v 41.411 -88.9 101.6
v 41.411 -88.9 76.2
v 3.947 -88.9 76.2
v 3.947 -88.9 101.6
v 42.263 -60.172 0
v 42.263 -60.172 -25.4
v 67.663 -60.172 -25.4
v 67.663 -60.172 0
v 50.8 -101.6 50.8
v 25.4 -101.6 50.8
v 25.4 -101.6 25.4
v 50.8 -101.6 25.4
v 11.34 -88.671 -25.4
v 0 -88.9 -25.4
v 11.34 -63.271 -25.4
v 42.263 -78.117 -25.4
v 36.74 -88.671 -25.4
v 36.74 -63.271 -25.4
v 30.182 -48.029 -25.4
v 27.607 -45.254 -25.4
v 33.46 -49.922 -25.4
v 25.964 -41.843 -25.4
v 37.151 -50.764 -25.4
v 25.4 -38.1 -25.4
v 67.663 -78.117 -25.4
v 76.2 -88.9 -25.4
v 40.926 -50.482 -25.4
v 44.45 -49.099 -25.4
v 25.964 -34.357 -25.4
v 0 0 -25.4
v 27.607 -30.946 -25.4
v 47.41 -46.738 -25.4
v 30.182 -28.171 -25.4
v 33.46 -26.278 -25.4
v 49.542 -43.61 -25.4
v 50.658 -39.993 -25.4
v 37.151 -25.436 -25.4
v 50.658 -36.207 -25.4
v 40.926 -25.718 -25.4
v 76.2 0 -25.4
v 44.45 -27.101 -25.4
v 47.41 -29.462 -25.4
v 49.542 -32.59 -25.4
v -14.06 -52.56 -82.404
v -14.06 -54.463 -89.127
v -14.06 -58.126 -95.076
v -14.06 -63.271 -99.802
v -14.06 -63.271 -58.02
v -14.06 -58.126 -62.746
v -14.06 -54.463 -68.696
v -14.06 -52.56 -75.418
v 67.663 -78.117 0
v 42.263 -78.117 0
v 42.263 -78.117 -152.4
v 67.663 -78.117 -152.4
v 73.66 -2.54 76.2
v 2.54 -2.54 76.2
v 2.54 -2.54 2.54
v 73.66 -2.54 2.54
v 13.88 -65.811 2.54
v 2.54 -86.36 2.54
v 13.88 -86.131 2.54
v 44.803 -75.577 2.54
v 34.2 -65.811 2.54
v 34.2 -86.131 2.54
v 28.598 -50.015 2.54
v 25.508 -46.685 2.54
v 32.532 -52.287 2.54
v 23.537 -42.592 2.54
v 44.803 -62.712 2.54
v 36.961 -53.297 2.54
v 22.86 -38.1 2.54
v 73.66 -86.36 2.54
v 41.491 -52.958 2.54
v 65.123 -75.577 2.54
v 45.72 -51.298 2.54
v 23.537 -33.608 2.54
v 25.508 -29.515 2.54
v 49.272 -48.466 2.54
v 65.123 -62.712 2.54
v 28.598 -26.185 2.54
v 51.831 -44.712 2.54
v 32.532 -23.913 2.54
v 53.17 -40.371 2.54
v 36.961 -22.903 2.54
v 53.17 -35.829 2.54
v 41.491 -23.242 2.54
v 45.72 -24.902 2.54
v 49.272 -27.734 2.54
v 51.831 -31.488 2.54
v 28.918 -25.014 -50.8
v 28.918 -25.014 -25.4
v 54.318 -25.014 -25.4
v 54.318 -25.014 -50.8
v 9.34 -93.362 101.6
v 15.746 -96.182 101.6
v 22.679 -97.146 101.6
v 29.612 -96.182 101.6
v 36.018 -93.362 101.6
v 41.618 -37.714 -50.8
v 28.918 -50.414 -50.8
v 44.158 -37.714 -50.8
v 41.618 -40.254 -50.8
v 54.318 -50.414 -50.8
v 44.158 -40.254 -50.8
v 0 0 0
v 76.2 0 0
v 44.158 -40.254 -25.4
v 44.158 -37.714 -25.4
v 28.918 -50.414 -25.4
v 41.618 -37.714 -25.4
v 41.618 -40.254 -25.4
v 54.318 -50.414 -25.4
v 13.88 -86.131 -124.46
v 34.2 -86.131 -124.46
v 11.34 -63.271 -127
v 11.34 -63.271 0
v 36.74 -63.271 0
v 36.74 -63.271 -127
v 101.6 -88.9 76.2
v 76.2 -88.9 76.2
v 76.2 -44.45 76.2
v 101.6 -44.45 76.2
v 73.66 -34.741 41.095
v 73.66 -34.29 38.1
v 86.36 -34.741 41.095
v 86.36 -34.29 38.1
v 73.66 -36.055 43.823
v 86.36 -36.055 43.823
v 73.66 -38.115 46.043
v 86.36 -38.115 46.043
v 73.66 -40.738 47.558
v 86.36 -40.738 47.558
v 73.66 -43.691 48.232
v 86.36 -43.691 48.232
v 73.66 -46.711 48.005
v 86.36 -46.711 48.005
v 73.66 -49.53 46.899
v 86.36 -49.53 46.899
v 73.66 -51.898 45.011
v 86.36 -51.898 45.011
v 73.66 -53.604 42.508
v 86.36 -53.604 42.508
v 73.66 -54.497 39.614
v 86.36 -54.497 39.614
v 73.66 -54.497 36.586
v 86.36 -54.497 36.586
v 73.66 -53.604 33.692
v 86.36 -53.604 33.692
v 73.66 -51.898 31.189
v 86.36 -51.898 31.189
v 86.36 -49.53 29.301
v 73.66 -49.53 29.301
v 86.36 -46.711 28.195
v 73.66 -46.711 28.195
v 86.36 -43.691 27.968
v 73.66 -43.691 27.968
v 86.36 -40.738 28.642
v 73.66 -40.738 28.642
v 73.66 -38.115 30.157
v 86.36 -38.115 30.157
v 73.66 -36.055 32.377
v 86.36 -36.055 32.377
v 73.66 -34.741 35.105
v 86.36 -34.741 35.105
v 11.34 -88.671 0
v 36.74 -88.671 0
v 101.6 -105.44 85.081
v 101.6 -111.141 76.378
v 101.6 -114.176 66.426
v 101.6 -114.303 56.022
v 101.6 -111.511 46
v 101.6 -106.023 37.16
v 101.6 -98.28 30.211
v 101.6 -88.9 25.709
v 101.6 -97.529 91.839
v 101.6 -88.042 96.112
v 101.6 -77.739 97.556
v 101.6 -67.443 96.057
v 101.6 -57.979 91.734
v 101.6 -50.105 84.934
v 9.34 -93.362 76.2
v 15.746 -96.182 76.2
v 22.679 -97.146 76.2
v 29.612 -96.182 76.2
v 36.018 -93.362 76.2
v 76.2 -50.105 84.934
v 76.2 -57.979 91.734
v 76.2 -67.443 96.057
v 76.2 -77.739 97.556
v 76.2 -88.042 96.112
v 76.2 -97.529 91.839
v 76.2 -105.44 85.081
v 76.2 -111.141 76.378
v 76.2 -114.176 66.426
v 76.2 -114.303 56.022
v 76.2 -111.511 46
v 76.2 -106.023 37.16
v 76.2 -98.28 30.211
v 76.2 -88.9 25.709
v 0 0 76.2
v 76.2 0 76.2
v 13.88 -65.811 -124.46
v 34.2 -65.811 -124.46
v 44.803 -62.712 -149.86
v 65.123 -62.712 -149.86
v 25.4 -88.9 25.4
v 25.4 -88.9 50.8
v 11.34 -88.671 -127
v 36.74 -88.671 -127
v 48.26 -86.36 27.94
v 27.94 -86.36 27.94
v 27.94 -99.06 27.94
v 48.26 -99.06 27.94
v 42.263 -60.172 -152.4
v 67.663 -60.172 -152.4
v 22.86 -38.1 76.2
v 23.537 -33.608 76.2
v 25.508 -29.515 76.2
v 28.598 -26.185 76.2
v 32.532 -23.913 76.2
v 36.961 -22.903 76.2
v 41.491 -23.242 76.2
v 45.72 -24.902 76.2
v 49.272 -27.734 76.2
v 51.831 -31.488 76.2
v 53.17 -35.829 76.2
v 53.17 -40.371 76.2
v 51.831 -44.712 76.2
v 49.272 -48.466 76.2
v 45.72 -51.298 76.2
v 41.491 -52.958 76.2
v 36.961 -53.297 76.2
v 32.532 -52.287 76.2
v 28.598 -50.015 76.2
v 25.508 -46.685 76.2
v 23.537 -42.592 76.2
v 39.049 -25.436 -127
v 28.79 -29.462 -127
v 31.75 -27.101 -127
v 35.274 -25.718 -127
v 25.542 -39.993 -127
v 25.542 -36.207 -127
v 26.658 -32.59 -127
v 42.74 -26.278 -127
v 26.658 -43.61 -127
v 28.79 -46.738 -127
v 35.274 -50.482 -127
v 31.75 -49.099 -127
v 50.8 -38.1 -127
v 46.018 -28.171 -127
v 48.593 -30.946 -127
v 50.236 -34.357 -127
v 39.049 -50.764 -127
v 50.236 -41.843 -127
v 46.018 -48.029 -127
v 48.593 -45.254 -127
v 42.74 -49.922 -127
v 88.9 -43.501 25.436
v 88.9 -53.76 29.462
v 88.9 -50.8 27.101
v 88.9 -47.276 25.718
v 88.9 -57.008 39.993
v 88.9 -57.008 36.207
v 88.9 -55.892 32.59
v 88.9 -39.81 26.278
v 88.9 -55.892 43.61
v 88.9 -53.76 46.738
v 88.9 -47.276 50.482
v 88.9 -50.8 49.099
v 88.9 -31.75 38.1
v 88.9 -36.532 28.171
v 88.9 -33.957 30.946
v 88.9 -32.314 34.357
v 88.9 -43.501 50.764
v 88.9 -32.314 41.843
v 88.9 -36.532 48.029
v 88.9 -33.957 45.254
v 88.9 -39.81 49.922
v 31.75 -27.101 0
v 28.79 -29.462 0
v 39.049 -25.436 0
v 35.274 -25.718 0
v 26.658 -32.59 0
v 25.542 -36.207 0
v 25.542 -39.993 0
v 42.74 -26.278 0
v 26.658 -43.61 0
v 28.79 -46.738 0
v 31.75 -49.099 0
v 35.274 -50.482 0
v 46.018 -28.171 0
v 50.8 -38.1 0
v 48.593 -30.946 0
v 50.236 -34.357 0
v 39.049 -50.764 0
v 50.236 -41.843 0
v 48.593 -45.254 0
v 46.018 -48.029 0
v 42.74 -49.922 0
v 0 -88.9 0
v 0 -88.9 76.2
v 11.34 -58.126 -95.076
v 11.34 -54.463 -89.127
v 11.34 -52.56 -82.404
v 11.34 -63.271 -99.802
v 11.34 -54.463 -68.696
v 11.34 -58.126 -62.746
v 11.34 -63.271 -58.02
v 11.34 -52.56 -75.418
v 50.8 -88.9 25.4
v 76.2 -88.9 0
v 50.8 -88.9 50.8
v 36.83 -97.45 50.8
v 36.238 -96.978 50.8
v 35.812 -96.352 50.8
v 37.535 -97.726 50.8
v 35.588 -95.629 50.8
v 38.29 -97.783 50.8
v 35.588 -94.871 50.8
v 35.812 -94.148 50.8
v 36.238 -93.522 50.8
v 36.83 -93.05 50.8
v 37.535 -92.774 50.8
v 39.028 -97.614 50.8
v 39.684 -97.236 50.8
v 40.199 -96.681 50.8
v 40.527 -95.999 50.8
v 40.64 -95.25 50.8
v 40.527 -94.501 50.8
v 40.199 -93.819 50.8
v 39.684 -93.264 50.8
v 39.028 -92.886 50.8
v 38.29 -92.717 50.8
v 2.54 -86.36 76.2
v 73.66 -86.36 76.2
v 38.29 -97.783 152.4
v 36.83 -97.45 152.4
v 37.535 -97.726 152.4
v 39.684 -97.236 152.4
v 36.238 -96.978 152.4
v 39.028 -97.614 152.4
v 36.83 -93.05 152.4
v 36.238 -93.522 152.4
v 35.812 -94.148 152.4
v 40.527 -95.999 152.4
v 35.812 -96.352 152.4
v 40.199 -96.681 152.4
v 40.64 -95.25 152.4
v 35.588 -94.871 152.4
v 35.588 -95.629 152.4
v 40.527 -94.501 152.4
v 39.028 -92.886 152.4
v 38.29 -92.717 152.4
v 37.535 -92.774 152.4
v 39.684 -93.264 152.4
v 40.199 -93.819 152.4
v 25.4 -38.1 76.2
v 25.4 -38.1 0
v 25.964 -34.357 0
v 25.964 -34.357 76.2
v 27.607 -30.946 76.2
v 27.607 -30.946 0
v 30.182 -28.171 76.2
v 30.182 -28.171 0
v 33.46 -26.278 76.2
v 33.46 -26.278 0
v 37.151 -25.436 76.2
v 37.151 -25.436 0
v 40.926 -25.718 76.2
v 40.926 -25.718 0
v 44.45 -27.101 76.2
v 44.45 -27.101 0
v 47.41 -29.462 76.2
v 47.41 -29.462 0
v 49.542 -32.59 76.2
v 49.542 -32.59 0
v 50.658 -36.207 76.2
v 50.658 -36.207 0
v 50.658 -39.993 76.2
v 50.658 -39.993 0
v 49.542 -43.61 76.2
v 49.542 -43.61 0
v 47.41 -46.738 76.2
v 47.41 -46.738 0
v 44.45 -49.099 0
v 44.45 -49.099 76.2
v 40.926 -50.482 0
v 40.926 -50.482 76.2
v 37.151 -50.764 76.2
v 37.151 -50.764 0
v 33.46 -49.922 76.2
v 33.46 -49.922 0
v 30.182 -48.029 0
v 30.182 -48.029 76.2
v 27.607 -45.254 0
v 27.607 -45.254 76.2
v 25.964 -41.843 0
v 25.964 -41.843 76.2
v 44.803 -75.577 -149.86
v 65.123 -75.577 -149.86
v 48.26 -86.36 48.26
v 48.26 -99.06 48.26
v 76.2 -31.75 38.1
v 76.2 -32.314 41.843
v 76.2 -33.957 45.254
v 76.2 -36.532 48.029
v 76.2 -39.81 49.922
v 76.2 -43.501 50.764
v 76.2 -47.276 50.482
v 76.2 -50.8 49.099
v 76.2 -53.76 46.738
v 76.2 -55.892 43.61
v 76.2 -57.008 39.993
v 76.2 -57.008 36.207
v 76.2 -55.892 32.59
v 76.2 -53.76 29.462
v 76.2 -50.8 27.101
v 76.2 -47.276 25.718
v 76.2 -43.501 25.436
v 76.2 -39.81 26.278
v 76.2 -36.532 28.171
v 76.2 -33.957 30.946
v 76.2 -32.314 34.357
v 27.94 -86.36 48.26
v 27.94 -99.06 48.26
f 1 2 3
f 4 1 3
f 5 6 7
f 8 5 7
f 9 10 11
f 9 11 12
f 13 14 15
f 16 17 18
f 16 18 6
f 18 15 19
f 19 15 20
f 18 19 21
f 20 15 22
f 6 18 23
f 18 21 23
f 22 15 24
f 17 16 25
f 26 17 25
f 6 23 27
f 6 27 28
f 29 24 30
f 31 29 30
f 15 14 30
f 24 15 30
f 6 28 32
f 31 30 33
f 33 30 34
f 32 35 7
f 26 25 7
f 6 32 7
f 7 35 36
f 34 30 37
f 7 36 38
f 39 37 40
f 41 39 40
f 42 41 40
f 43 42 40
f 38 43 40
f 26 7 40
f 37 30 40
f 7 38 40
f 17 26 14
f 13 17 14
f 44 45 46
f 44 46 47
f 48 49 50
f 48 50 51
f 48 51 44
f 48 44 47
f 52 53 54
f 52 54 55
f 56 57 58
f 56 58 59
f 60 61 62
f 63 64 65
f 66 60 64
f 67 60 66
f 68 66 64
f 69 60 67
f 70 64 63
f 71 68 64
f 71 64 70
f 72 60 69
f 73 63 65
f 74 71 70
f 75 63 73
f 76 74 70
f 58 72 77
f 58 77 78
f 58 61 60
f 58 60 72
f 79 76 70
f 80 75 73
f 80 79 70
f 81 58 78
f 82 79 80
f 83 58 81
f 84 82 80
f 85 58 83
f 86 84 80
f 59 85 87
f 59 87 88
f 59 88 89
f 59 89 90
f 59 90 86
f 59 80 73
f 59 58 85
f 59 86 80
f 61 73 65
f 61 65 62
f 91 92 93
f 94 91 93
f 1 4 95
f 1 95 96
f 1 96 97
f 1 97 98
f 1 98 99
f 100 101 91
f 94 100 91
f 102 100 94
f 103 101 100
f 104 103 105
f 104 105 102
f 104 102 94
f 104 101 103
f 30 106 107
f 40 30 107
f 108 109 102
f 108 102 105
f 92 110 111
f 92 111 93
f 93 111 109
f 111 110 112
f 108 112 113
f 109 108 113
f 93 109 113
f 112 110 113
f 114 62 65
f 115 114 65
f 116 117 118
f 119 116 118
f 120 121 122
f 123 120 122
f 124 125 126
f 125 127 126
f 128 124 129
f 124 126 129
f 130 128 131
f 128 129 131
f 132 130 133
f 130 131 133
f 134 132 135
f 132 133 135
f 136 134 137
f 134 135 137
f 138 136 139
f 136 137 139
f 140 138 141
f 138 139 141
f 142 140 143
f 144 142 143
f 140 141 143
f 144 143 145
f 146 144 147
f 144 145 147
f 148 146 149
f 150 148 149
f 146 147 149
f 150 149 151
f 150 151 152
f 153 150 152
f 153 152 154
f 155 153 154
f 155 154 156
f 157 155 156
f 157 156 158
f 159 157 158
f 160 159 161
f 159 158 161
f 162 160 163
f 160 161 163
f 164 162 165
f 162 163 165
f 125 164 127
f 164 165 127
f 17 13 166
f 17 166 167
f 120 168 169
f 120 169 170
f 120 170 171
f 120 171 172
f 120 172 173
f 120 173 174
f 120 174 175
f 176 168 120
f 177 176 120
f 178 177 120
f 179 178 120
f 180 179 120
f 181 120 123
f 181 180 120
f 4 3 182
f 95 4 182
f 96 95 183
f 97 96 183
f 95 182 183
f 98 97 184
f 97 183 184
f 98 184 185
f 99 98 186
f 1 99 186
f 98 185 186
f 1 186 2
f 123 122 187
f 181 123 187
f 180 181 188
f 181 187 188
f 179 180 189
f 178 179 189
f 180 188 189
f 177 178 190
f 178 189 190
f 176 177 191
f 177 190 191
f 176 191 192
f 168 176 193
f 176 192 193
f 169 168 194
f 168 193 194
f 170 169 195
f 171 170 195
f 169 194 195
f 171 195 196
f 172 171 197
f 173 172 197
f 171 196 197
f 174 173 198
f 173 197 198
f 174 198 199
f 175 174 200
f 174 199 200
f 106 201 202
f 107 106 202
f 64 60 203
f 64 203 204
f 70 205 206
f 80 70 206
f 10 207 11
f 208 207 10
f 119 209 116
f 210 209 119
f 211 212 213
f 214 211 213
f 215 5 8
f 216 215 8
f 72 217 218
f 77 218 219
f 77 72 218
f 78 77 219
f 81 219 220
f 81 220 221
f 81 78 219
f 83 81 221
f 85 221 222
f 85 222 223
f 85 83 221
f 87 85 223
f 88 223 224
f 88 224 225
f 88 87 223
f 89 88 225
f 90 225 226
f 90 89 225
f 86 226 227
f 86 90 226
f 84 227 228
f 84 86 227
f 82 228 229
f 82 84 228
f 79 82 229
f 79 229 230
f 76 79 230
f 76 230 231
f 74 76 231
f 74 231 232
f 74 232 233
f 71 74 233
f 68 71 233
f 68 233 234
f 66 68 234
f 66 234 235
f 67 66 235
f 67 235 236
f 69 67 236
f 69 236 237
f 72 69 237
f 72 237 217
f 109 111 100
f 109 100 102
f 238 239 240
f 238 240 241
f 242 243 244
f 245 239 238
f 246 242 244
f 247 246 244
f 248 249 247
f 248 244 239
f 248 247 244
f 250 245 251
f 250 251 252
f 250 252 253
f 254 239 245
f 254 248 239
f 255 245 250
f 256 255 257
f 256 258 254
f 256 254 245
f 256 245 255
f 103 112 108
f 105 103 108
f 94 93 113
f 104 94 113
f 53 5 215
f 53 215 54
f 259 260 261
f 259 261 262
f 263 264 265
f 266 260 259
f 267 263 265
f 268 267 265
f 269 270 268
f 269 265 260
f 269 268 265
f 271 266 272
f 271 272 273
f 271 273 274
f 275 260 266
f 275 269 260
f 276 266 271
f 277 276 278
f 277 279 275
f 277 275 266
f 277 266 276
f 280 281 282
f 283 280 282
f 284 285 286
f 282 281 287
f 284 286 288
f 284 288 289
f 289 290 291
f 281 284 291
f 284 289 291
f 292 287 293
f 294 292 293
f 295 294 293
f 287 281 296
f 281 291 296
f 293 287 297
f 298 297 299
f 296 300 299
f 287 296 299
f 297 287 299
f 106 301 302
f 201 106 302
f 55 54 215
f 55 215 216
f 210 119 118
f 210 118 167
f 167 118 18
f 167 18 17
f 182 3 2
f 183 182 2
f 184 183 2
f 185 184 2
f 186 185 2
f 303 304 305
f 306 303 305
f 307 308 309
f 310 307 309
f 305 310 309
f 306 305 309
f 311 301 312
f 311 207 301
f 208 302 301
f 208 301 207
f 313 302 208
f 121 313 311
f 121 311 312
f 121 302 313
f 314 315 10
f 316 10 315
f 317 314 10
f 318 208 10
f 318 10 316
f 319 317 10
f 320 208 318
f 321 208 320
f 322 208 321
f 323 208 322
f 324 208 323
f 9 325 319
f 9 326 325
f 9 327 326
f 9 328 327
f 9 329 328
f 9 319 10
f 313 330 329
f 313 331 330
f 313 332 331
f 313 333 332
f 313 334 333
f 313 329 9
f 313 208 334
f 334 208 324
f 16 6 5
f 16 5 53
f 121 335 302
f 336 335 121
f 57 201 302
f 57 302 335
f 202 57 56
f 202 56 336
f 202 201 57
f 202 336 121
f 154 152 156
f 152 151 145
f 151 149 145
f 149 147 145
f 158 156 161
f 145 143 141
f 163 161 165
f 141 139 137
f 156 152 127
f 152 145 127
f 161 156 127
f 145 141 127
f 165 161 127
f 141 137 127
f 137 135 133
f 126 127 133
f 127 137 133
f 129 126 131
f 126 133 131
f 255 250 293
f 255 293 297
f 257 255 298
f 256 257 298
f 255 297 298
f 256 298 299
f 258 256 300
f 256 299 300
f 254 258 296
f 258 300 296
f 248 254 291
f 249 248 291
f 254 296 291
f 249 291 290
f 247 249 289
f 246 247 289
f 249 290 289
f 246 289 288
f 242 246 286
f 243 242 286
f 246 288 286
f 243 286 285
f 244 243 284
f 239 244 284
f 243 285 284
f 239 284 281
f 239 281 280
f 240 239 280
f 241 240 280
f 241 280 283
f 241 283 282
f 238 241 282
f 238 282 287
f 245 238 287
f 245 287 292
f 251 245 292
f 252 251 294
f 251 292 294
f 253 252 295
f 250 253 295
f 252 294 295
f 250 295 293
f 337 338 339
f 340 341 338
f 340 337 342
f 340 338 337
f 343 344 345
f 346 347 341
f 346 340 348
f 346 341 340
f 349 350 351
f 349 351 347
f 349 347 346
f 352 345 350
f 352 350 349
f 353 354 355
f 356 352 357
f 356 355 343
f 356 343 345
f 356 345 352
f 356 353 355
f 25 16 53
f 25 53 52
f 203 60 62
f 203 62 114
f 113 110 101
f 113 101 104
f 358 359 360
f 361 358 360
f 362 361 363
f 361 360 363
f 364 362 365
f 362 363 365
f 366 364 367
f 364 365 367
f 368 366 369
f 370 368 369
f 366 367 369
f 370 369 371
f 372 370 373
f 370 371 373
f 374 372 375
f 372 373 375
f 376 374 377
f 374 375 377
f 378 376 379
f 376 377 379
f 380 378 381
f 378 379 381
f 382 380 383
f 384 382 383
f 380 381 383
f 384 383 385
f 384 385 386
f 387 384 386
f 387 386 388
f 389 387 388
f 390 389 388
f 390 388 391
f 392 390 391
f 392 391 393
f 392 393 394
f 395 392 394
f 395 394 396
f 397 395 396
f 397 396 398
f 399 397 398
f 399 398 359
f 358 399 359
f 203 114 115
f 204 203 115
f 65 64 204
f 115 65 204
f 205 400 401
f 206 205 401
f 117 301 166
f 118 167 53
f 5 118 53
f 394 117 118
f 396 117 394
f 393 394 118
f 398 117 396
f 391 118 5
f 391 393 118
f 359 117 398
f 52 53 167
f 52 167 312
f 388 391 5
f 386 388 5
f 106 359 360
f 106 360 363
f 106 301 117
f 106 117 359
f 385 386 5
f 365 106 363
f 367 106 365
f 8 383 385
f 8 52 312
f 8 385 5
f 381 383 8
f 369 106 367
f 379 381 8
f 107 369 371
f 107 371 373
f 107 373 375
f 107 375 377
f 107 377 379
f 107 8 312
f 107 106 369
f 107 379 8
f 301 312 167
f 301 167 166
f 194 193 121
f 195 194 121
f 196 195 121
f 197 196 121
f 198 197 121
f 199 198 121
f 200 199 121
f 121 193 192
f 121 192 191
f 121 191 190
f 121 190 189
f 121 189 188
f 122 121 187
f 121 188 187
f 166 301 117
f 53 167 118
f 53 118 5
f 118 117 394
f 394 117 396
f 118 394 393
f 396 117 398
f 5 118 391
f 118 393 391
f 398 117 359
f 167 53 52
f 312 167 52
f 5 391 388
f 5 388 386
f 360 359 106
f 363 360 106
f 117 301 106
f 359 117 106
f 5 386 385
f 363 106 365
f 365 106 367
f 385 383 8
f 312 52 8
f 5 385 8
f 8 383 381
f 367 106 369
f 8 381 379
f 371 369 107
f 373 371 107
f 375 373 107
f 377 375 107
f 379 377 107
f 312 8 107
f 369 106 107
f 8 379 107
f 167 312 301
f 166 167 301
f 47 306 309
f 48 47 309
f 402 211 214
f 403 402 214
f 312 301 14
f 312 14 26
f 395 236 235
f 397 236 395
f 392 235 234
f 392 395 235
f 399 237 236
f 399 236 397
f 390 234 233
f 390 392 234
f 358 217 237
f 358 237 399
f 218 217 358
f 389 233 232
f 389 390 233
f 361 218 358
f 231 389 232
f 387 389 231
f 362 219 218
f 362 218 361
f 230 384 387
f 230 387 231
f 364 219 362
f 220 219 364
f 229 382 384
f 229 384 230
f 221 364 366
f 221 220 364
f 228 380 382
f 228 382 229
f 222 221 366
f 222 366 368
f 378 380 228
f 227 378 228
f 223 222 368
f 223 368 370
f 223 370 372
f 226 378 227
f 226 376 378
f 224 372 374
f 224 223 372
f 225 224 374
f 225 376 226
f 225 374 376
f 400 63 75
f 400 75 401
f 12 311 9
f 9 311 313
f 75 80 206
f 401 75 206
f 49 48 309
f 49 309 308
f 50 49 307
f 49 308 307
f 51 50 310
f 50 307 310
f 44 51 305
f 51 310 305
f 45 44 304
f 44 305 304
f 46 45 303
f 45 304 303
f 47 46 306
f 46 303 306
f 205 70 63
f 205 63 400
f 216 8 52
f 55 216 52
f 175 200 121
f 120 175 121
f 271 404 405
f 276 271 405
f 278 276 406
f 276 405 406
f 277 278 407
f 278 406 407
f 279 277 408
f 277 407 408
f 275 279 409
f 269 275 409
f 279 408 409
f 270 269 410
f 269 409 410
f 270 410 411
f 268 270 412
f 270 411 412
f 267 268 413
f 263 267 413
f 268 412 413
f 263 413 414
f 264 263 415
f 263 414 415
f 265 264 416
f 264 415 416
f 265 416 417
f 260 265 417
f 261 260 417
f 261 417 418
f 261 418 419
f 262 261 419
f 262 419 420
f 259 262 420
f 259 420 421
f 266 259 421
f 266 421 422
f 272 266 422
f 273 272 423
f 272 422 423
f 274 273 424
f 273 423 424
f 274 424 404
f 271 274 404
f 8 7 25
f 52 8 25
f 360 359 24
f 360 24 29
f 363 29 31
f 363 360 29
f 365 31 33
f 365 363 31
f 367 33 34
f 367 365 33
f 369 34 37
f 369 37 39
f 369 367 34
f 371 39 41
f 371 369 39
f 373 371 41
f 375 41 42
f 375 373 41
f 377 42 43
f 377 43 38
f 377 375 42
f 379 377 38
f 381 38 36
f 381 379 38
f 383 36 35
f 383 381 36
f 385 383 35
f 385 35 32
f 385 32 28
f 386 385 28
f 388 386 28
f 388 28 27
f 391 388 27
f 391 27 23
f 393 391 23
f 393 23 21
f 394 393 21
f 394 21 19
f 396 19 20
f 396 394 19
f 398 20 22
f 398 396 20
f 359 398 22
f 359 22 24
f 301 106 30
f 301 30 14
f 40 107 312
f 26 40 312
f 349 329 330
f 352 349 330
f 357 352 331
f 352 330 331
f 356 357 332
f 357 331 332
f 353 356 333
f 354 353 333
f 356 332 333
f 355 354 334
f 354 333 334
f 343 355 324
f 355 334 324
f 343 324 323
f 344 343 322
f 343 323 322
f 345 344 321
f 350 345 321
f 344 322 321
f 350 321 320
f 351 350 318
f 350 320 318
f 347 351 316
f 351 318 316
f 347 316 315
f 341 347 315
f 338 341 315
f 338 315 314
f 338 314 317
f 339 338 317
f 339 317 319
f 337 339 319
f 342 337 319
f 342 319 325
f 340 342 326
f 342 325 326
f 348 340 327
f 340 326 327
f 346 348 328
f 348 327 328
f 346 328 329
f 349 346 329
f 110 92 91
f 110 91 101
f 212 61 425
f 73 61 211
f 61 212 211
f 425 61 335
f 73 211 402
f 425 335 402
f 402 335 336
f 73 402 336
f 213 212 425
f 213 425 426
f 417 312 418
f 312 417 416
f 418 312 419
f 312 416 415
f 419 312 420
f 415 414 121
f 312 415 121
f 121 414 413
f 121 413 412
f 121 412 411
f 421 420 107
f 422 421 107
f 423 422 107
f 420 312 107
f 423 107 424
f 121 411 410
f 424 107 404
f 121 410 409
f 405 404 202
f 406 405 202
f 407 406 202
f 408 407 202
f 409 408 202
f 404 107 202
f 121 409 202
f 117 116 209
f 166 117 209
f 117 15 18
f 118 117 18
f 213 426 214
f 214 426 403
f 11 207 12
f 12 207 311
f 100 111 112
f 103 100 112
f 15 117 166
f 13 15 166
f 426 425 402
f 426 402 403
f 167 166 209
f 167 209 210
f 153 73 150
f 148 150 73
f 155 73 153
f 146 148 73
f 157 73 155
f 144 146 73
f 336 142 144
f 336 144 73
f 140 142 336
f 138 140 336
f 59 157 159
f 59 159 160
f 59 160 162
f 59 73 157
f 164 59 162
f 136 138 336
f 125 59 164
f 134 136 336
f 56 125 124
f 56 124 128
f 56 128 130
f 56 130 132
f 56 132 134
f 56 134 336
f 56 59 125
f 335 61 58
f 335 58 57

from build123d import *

# Parameters (mm, degrees)
F0_W          = 76.2
F0_H          = 76.2
F1_DEPTH      = 76.2
F3_D          = 25.4
F5_W          = 76.2
F5_H          = 76.2
F5_W_2        = 25.4
F5_H_2        = 25.4
F1_FACE1_W    = 76.2
F1_FACE1_H    = 76.2
F1_FACE2_W    = 76.2
F1_FACE2_H    = 76.2
F4_W          = 76.2
F4_H          = 76.2
F6_DEPTH      = 12.7
F7_W          = 25.4
F7_H          = 25.4
F8_DEPTH      = 12.7
F9_R          = 12.7
F10_DEPTH     = 12.7
F11_DEPTH     = 12.7
F14_DEPTH     = 25.4
F16_DEPTH     = 25.4
F17_R         = 2.54
F18_DEPTH     = 101.6
F21_W         = 25.4
F21_H         = 17.9451964796
F22_DEPTH     = 177.8
F23_W         = 25.4
F23_H         = 25.4
F24_DEPTH     = 127
F23_R         = 12.7
F25_DEPTH     = 25.4
F26_W         = 25.4
F26_H         = 25.4
F26_W_2       = 2.54
F26_H_2       = 2.54
F27_DEPTH     = 25.4
F28_T         = 2.54
F28_T3_DEPTH  = 30.48
F28_T5_DEPTH  = 30.48
F28_T7_DEPTH  = 30.48
F28_T9_DEPTH  = 30.48
F28_T11_DEPTH = 23.0251964796
F28_T13_DEPTH = 30.48
F30_DEPTH     = 25.4


# Not quite as in the source:
# - a shell that OpenCascade refuses in one call is made with other operations: the cavity is built on its own and cut out
# - the program builds the solid bodies; features that only make, move or delete a surface that nothing else refers to are left out


with BuildPart() as f1:
    # F0 (on Front) → F1 (new body)
    with BuildSketch(Plane.XZ):
        with Locations((38.1, 38.1)):
            Rectangle(F0_W, F0_H)
    extrude(amount=F1_DEPTH)

    # F3 (through all)
    with Locations(Plane.XY.offset(76.2)):
        with Locations((38.1, -38.1)):
            Hole(F3_D / 2)

    # F5 (on face) + F1_face1 (on face) + F1_face2 (on face) + F4 (on face) → F6 (join)
    with BuildSketch(Plane.XZ.offset(76.2)):
        with Locations((38.1, 38.1)):
            Rectangle(F5_W, F5_H)
        with Locations((42.7430447519, 38.5519705385)):
            Rectangle(F5_W_2, F5_H_2, mode=Mode.SUBTRACT)
        with Locations((42.7430447519, 38.5519705385)):
            Rectangle(F5_W_2, F5_H_2)
    with BuildSketch(Plane(origin=(38.1, -76.2, 38.1), x_dir=(1, 0, 0), z_dir=(0, -1, 0))):
        Rectangle(F1_FACE1_W, F1_FACE1_H)
    with BuildSketch(Plane(origin=(38.1, 0, 38.1), x_dir=(1, 0, 0), z_dir=(0, 1, 0))):
        Rectangle(F1_FACE2_W, F1_FACE2_H)
    with BuildSketch(Plane.XZ.offset(76.2)):
        with Locations((38.1, 38.1)):
            Rectangle(F4_W, F4_H)
    extrude(amount=F6_DEPTH, dir=(0, -1, 0))

    # F7 (on face) → F8 (join)
    with BuildSketch(Plane.XZ.offset(88.9)):
        with Locations((38.1, 38.1)):
            Rectangle(F7_W, F7_H)
    extrude(amount=F8_DEPTH)

    # F9 (on face) → F10 (join)
    with BuildSketch(Plane.YZ.offset(76.2)):
        with Locations((-44.45, 38.1)):
            Circle(F9_R)
    extrude(amount=F10_DEPTH)

    # F9 (on face) → F11 (join)
    with BuildSketch(Plane.YZ.offset(76.2)):
        with Locations((-44.45, 38.1)):
            Circle(F9_R)
    extrude(amount=F11_DEPTH)

    # F17 (on face) → F18 (join)
    with BuildSketch(Plane.XY.offset(50.8)):
        with Locations((38.1, -95.25)):
            Circle(F17_R)
    extrude(amount=F18_DEPTH)

    # F21 (on face) → F22 (join)
    with BuildSketch(Plane(origin=(0, 0, 25.4), x_dir=(1, 0, 0), z_dir=(0, 0, -1))):
        with Locations((54.9631331444, 69.1445562989)):
            Rectangle(F21_W, F21_H)
    extrude(amount=F22_DEPTH)

    # F23 (on face) → F24 (join)
    with BuildSketch(Plane(origin=(0, 0, 0), x_dir=(1, 0, 0), z_dir=(0, 0, -1))):
        with Locations((24.0401503026, 75.9710382342)):
            Rectangle(F23_W, F23_H)
    extrude(amount=F24_DEPTH)


with BuildPart() as f14:
    # F13 (on face) → F14 (new body)
    with BuildSketch(Plane.XY.offset(76.2)):
        with BuildLine():
            Line((41.4113799153, -88.9), (3.9465616716, -88.9))
            ThreePointArc((3.9465616716, -88.9), (22.6789707935, -97.1460835815), (41.4113799153, -88.9))
        make_face()
    extrude(amount=F14_DEPTH)


with BuildPart() as f16:
    # F15 (on face) → F16 (new body)
    with BuildSketch(Plane.YZ.offset(76.2)):
        with BuildLine():
            Line((-88.9, 76.2), (-44.45, 76.2))
            ThreePointArc((-44.45, 76.2), (-105.4397398951, 85.081047549), (-88.9, 25.7088454487))
            Line((-88.9, 25.7088454487), (-88.9, 76.2))
        make_face()
    extrude(amount=F16_DEPTH)


with BuildPart() as f24:
    # F23 (on face) → F24, piece 2 (new body)
    with BuildSketch(Plane(origin=(0, 0, 0), x_dir=(1, 0, 0), z_dir=(0, 0, -1))):
        with Locations((38.1, 38.1)):
            Circle(F23_R)
    extrude(amount=F24_DEPTH)


with BuildPart() as f25:
    # F25 (new): a face of the model
    f25_faces = [f1.part.faces().sort_by_distance(p)[0] for p in [
        (38.1, -1.1708821461, 0),
    ]]
    extrude(f25_faces, amount=F25_DEPTH)


with BuildPart() as f27:
    # F26 (on face) → F27 (new body)
    with BuildSketch(Plane(origin=(0, 0, -25.4), x_dir=(1, 0, 0), z_dir=(0, 0, -1))):
        with Locations((41.617895323, 37.7135920942)):
            Rectangle(F26_W, F26_H)
        with Locations((42.887895323, 38.9835920942)):
            Rectangle(F26_W_2, F26_H_2, mode=Mode.SUBTRACT)
    extrude(amount=F27_DEPTH)


with BuildPart() as f1_1:
    add(f1.part)

    # F28: shell of thickness 2.54, made by hand


with BuildPart() as f28_core1:
    # F28_t2: copy of F1
    add(f1_1.part)

    # the walls: a layer under each face that stays
    f28_faces = [f28_core1.faces().sort_by_distance(p)[0] for p in [
        (0, -44.45, 38.1),
        (38.1, 0, 38.1),
        (12.7, -88.9, 12.7),
        (12.7, -44.45, 0),
        (76.2, -74.0833333333, 12.7),
        (25.4, -38.1, 38.1),
        (46.5666666667, -99.4833333333, 50.8),
        (25.4, -95.25, 38.1),
        (38.1, -95.25, 25.4),
        (50.8, -95.25, 38.1),
        (11.3401503026, -75.9710382342, -63.5),
        (24.0401503026, -88.6710382342, -63.5),
        (36.7401503026, -75.9710382342, -63.5),
        (24.0401503026, -63.2710382342, -63.5),
        (67.6631331444, -69.1445562989, -76.2),
        (54.9631331444, -60.1719580591, -76.2),
        (54.9631331444, -78.1171545386, -76.2),
        (42.2631331444, -69.1445562989, -76.2),
        (82.55, -57.15, 38.1),
        (38.1, -101.6, 38.1),
        (24.0401503026, -75.9710382342, -127),
        (54.9631331444, -69.1445562989, -152.4),
        (88.9, -44.45, 38.1),
        (38.1, -95.25, 152.4),
    ]]
    thicken(f28_faces, amount=-F28_T, mode=Mode.SUBTRACT)

    # F28_s4 → F28_t3 (cut)
    with BuildSketch(Plane.YZ.offset(22.86)):
        Polygon((-88.9254, 50.8254), (-86.36, 50.8), (-86.36, 48.26), (-88.9, 48.26), align=None)
        Polygon((-88.9254, 25.3746), (-86.36, 25.4), (-86.36, 27.94), (-88.9, 27.94), align=None)
    extrude(amount=F28_T3_DEPTH, mode=Mode.SUBTRACT)

    # F28_s6 → F28_t5 (cut)
    with BuildSketch(Plane.XY.offset(22.86)):
        Polygon((25.3746, -88.9254), (25.4, -86.36), (27.94, -86.36), (27.94, -88.9), align=None)
        Polygon((50.8254, -88.9254), (50.8, -86.36), (48.26, -86.36), (48.26, -88.9), align=None)
    extrude(amount=F28_T5_DEPTH, mode=Mode.SUBTRACT)

    # F28_s8 → F28_t7 (cut)
    with BuildSketch(Plane.XZ.offset(60.7310382342)):
        Polygon((11.3147503026, -0.0254), (11.3401503026, 2.54), (13.8801503026, 2.54), (13.8801503026, 0), align=None)
        Polygon((36.7655503026, -0.0254), (36.7401503026, 2.54), (34.2001503026, 2.54), (34.2001503026, 0), align=None)
    extrude(amount=F28_T7_DEPTH, mode=Mode.SUBTRACT)

    # F28_s10 → F28_t9 (cut)
    with BuildSketch(Plane.YZ.offset(8.8001503026)):
        Polygon((-88.6964382342, -0.0254), (-88.6710382342, 2.54), (-86.1310382342, 2.54), (-86.1310382342, 0), align=None)
        Polygon((-63.2456382342, -0.0254), (-63.2710382342, 2.54), (-65.8110382342, 2.54), (-65.8110382342, 0), align=None)
    extrude(amount=F28_T9_DEPTH, mode=Mode.SUBTRACT)

    # F28_s12 → F28_t11 (cut)
    with BuildSketch(Plane.XZ.offset(57.6319580591)):
        Polygon((67.6885331444, -0.0254), (67.6631331444, 2.54), (65.1231331444, 2.54), (65.1231331444, 0), align=None)
        Polygon((42.2377331444, -0.0254), (42.2631331444, 2.54), (44.8031331444, 2.54), (44.8031331444, 0), align=None)
    extrude(amount=F28_T11_DEPTH, mode=Mode.SUBTRACT)

    # F28_s14 → F28_t13 (cut)
    with BuildSketch(Plane.YZ.offset(39.7231331444)):
        Polygon((-60.1465580591, -0.0254), (-60.1719580591, 2.54), (-62.7119580591, 2.54), (-62.7119580591, 0), align=None)
        Polygon((-78.1425545386, -0.0254), (-78.1171545386, 2.54), (-75.5771545386, 2.54), (-75.5771545386, 0), align=None)
    extrude(amount=F28_T13_DEPTH, mode=Mode.SUBTRACT)

    # F28_s15 → F28_t16 (revolve, cut)
    with BuildSketch(Plane.XY.offset(38.1)):
        Polygon((76.2254, -31.7246), (73.66, -31.75), (73.66, -34.29), (76.2, -34.29), align=None)
    revolve(axis=Axis((76.2, -44.45, 38.1), (1, 0, 0)), mode=Mode.SUBTRACT)

    # F28_s17 → F28_t18 (revolve, cut)
    with BuildSketch(Plane.XZ.offset(95.25)):
        Polygon((40.6654, 50.8254), (40.64, 48.26), (38.1, 48.26), (38.1, 50.8), align=None)
    revolve(axis=Axis((38.1, -95.25, 50.8), (0, 0, 1)), mode=Mode.SUBTRACT)


with BuildPart() as f1_2:
    add(f1_1.part)

    # what is left inside the walls is the cavity
    f28_cavity = [f28_core1.part.solids().sort_by_distance(p)[0] for p in [
        (22.8346, -38.1, 27.093333),
    ]]
    add(f28_cavity, mode=Mode.SUBTRACT)


with BuildPart() as f30:
    # F29 (on face) → F30 (new body)
    with BuildSketch(Plane(origin=(11.3401503026, 0, 0), x_dir=(0, -1, 0), z_dir=(-1, 0, 0))):
        with BuildLine():
            Line((63.2710382342, -99.802256586), (63.2710382342, -58.0201558769))
            ThreePointArc((63.2710382342, -58.0201558769), (52.3183222379, -78.9112062314), (63.2710382342, -99.802256586))
        make_face()
    extrude(amount=F30_DEPTH)


solid = Compound([f14.part, f16.part, f24.part, f25.part, f27.part, f1_2.part, f30.part])
